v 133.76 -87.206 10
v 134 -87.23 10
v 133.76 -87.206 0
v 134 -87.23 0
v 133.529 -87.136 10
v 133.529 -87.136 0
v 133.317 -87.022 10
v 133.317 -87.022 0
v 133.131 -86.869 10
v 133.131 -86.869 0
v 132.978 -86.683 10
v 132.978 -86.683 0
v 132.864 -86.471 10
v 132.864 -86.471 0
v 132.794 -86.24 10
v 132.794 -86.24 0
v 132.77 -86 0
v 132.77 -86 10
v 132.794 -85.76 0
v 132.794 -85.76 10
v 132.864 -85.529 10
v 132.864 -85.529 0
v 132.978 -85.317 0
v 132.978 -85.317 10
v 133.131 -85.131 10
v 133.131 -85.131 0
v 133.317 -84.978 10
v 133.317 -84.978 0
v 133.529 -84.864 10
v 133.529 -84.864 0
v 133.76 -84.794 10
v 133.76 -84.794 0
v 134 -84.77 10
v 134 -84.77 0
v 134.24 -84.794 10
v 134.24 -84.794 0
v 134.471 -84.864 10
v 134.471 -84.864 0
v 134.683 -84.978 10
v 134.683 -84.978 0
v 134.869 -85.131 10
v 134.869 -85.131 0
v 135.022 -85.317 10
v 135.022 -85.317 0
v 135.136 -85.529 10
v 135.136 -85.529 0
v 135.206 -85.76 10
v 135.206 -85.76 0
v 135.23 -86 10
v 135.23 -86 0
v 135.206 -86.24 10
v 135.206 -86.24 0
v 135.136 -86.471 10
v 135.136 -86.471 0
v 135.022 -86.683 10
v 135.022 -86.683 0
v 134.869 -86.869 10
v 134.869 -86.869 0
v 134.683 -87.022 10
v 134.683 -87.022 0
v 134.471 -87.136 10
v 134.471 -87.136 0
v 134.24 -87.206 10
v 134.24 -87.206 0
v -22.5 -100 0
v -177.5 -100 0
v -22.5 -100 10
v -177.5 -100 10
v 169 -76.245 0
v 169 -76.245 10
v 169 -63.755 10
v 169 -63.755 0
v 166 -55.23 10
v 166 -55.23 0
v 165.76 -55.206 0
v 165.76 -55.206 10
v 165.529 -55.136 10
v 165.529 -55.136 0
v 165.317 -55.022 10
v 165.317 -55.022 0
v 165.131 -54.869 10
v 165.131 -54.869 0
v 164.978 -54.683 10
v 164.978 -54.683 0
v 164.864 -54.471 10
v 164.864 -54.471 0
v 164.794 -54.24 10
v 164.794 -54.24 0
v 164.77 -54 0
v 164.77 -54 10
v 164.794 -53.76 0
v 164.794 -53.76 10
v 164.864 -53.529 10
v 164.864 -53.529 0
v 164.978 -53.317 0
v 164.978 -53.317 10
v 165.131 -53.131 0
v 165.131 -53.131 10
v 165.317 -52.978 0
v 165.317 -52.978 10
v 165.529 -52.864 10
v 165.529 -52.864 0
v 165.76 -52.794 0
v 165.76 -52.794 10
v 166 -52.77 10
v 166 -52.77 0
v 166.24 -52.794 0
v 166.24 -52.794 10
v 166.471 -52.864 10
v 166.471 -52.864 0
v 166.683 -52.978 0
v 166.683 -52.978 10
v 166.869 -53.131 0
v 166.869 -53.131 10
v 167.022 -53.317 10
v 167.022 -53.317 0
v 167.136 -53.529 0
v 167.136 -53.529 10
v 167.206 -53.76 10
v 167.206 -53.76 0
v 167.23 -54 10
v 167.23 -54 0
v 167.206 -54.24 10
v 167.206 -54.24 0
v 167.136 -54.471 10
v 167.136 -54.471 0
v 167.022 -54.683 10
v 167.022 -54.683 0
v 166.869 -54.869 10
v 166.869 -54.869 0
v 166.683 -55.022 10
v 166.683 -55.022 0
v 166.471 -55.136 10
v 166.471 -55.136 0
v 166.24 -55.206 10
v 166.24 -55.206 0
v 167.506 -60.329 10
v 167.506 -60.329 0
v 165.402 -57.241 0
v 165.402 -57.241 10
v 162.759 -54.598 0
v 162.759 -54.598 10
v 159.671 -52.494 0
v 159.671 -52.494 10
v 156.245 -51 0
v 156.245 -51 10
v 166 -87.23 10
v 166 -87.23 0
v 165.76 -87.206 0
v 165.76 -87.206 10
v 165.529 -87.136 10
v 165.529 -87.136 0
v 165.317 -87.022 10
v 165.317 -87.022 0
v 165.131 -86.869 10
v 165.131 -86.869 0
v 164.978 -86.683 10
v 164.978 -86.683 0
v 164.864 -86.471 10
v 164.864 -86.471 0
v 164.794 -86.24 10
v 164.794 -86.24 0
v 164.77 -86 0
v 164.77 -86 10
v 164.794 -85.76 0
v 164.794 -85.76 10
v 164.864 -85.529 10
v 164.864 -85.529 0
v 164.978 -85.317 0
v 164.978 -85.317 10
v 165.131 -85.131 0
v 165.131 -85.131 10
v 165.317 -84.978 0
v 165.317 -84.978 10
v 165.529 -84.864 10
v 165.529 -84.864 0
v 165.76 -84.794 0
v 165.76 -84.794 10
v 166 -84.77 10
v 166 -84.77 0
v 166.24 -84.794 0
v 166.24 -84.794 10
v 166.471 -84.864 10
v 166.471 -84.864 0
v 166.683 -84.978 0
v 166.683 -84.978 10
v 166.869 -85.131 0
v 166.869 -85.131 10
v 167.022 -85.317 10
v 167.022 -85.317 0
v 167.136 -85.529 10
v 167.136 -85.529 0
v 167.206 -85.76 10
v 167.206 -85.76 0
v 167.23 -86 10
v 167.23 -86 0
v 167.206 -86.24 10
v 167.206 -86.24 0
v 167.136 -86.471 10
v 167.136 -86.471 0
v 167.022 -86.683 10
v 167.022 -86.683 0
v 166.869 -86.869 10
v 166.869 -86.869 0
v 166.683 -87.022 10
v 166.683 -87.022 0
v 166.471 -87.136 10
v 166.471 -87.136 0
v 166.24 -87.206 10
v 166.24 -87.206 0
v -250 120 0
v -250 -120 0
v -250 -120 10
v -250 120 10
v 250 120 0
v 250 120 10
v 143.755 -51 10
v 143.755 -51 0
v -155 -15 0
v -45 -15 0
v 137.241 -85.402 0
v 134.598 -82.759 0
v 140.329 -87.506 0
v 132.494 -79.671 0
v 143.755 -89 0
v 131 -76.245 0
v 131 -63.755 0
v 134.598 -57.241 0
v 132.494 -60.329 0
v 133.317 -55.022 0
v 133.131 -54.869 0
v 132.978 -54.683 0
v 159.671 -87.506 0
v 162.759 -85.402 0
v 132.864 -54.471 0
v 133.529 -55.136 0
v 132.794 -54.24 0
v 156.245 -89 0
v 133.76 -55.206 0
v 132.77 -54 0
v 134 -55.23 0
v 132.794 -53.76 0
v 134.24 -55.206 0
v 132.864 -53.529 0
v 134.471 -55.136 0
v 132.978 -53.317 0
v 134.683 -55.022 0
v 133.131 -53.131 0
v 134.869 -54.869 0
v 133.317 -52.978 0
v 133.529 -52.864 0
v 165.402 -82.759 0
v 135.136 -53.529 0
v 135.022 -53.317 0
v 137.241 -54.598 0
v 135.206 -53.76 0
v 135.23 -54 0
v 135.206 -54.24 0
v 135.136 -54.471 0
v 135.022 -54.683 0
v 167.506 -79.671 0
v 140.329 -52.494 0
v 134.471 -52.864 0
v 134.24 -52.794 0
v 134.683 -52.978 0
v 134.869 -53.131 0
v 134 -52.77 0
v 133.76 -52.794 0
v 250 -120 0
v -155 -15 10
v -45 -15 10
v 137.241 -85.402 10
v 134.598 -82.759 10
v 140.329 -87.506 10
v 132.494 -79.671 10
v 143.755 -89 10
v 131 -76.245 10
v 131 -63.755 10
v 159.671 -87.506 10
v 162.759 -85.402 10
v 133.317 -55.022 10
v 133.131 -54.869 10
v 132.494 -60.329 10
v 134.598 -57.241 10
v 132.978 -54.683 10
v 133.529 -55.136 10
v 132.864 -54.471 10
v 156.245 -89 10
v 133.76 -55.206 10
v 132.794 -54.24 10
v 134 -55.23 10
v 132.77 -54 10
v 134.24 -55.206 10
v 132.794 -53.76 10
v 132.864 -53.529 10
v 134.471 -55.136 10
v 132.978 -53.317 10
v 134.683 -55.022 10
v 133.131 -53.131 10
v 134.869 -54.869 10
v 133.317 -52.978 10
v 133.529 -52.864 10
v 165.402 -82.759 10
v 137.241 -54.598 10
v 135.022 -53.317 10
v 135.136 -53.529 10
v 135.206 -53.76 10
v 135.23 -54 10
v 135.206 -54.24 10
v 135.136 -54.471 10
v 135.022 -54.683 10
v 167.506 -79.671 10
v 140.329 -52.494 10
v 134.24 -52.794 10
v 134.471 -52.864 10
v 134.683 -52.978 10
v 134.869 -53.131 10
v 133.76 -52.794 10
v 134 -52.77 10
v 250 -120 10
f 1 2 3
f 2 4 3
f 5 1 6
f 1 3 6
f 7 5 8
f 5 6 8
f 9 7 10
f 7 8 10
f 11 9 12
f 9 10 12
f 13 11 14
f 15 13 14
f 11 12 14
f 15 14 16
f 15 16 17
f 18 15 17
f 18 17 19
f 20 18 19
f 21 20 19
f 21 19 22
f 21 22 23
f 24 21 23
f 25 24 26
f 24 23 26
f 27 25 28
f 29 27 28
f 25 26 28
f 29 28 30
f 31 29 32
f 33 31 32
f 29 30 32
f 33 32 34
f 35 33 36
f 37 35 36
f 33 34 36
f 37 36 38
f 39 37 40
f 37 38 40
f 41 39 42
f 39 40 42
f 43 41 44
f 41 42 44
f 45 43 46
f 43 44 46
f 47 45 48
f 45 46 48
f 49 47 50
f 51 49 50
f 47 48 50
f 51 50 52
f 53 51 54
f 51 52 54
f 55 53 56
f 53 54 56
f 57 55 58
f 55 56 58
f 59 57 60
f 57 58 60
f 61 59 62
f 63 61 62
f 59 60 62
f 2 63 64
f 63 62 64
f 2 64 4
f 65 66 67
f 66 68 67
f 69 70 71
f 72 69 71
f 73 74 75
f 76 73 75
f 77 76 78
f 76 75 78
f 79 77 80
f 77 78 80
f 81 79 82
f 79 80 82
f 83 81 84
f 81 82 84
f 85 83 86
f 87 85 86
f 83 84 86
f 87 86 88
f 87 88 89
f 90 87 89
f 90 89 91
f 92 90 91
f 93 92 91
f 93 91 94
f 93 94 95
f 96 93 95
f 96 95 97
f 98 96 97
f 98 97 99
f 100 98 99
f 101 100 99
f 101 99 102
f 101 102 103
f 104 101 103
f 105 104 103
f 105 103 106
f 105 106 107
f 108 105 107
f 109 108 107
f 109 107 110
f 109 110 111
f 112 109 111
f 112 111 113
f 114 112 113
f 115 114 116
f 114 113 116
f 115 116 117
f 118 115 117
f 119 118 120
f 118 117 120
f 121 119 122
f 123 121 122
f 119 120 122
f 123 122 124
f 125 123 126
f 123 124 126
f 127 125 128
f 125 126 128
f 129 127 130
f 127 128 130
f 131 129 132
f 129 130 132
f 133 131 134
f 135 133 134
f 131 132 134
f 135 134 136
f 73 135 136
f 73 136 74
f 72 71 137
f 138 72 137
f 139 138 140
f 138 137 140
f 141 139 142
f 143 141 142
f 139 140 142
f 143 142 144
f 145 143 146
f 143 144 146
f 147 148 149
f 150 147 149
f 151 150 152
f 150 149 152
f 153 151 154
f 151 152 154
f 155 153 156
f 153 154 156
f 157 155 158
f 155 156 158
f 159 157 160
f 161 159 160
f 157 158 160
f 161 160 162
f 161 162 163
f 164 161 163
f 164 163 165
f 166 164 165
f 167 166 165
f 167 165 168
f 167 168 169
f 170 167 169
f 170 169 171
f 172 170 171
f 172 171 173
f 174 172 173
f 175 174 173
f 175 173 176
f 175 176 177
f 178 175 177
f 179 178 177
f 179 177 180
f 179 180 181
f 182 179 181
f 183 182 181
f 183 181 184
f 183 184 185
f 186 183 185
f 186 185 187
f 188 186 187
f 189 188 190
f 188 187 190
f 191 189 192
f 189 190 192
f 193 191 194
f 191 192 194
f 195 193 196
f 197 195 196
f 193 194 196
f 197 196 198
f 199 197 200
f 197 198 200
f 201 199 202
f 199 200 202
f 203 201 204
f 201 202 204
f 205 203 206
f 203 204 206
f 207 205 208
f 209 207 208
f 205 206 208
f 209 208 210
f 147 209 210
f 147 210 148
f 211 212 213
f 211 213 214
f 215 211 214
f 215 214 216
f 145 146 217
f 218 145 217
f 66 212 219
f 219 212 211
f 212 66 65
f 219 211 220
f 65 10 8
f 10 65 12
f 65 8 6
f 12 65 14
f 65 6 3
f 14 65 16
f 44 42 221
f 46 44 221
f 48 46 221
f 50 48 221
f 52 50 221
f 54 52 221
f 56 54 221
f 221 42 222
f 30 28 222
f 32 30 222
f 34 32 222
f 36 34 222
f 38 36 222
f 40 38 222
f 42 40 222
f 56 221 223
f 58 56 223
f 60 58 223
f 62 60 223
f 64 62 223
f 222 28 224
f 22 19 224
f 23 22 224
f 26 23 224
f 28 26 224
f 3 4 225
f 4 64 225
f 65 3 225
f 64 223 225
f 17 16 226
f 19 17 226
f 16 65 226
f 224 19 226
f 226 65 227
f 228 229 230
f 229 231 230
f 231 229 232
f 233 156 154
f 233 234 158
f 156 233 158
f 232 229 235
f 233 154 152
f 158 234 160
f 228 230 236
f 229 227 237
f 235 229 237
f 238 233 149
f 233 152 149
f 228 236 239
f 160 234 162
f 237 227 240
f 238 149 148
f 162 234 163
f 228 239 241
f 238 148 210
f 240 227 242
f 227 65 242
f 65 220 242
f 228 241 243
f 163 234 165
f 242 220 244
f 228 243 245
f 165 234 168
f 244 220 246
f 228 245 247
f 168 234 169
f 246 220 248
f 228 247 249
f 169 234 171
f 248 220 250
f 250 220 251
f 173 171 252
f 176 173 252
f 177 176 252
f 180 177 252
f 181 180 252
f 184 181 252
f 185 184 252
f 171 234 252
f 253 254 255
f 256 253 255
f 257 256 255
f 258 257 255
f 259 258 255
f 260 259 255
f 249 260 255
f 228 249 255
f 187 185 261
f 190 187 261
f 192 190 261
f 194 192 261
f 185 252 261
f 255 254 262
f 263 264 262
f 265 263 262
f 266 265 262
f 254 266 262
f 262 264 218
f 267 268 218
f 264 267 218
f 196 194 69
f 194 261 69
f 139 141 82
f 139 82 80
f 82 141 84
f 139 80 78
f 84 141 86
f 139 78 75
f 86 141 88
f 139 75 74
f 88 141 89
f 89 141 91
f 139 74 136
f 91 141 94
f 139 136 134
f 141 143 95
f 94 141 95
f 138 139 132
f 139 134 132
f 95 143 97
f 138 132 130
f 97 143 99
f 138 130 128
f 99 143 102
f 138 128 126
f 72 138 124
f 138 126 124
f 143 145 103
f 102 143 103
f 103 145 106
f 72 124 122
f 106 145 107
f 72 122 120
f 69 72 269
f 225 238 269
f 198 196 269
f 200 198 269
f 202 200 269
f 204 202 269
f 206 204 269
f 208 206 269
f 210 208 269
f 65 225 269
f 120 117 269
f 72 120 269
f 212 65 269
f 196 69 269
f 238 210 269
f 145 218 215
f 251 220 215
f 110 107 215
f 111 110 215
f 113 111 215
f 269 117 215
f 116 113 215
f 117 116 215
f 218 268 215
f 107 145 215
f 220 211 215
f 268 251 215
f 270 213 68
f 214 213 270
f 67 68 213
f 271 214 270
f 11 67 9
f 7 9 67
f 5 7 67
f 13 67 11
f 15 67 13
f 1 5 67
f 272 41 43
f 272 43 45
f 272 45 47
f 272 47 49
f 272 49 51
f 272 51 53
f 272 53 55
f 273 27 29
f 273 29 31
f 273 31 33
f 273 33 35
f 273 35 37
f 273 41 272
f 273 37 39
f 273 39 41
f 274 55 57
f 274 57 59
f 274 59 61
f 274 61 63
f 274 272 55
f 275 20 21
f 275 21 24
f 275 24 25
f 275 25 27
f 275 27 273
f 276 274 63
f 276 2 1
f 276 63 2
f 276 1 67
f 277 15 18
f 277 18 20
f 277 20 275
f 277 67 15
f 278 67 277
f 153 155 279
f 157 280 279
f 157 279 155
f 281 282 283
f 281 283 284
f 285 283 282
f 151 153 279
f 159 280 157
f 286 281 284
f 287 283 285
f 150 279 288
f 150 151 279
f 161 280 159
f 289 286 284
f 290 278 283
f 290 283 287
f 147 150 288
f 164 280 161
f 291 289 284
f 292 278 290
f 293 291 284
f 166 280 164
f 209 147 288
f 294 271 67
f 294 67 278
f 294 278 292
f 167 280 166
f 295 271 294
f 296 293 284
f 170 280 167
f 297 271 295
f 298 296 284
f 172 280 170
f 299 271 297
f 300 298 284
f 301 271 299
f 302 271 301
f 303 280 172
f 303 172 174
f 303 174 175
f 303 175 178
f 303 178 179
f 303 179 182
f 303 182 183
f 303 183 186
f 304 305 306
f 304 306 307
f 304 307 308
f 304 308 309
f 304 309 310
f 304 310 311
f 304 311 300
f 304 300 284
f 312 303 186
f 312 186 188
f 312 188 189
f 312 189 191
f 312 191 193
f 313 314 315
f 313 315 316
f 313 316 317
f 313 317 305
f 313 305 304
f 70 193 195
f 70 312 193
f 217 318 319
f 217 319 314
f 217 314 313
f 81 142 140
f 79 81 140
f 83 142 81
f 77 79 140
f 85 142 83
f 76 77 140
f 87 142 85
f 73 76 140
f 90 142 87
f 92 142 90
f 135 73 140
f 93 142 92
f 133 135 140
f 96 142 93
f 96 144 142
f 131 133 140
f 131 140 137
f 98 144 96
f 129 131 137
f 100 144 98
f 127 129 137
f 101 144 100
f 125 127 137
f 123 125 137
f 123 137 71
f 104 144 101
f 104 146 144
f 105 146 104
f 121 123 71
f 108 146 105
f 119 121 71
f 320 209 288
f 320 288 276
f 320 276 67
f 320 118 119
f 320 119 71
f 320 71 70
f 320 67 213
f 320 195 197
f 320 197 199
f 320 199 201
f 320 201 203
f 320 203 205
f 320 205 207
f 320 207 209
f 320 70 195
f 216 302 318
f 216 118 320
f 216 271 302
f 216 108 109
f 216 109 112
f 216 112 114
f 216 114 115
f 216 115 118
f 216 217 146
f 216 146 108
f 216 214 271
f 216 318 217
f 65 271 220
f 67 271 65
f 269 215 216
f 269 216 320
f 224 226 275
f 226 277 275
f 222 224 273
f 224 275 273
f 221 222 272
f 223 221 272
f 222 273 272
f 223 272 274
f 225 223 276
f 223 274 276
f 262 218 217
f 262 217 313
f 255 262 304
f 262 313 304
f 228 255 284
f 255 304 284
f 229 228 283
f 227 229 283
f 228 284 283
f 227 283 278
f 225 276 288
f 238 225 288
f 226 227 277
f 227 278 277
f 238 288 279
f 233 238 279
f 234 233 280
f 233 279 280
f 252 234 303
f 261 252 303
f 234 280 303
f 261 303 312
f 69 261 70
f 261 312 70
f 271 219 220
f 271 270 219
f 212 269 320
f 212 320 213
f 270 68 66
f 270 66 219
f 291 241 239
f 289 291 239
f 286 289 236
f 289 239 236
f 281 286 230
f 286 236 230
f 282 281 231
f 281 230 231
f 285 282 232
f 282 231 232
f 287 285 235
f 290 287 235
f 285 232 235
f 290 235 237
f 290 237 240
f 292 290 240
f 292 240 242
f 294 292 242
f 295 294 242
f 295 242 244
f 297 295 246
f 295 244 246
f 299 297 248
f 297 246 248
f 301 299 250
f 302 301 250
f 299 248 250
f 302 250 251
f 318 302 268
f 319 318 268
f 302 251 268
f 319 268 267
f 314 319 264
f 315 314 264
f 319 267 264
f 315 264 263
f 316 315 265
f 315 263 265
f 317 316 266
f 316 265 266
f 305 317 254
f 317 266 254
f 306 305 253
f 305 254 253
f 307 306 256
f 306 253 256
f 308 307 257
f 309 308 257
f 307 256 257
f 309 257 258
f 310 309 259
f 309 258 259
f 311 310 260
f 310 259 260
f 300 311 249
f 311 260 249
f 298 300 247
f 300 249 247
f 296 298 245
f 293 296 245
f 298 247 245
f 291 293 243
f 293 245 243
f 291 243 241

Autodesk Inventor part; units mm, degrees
ref_plane "YZ Plane" through (0, 0, 0) normal (1, 0, 0) x (0, 1, 0)
ref_plane "XZ Plane" through (0, 0, 0) normal (0, 1, 0) x (-1, 0, 0)
ref_plane "XY Plane" through (0, 0, 0) normal (0, 0, 1) x (1, 0, 0)
sketch "Skizze1" plane through (0, 0, 0) normal (0, 0, 1) x (1, 0, 0)
  line L0 (-250, 120) -> (250, 120)
  line L1 (250, 120) -> (250, -120)
  line L2 (250, -120) -> (-250, -120)
  line L3 (-250, -120) -> (-250, 120)
  line L4 (-250, 120) -> (250, -120) construction
  line L5 (250, 120) -> (-250, -120) construction
  point P0 (0, 0)
  dimension "d0" = 500
  dimension "d1" = 240
extrude "Extrusion1" add sketch "Skizze1" along normal blind 10
sketch "Skizze2" plane through (0, 0, 10) normal (0, 0, 1) x (1, 0, 0)
  line L0 (-250, 120) -> (-250, -120) projected
  line L1 (-250, -120) -> (250, -120) projected
  line L2 (250, -120) -> (250, 120) projected
  line L3 (-177.5, -100) -> (-155, -15)
  line L4 (-155, -15) -> (-45, -15)
  line L5 (-45, -15) -> (-22.5, -100)
  line L6 (-177.5, -100) -> (-22.5, -100)
  line L7 (143.755, -89) -> (156.245, -89)
  line L8 (169, -76.245) -> (169, -63.755)
  line L9 (156.245, -51) -> (143.755, -51)
  line L10 (131, -63.755) -> (131, -76.245)
  line L11 (143.755, -89) -> (156.245, -51) construction
  line L12 (169, -76.245) -> (131, -63.755) construction
  arc A0 (156.245, -89) -> (169, -76.245) centre (150, -70) ccw
  arc A1 (131, -76.245) -> (143.755, -89) centre (150, -70) ccw
  arc A2 (169, -63.755) -> (156.245, -51) centre (150, -70) ccw
  arc A3 (143.755, -51) -> (131, -63.755) centre (150, -70) ccw
  point P0 (0, 0)
  point P1 (-100, -15)
  point P2 (-100, -100)
  point P3 (-33.75, -57.5)
  dimension "d25" = 155
  dimension "d26" = 110
  dimension "d27" = 150
  dimension "d28" = 20
  dimension "d29" = 85
  dimension "d33" = 100
  dimension "d34" = 50
  dimension "d47" = 38
  dimension "d48" = 20
extrude "Extrusion2" cut sketch "Skizze2" against normal blind 10
sketch "Skizze3" plane through (0, 0, 10) normal (0, 0, 1) x (1, 0, 0)
  circle A0 centre (150, -70) radius 20 projected
  line L0 (134, -86) -> (166, -86)
  line L1 (166, -86) -> (166, -54)
  line L2 (166, -54) -> (134, -54)
  line L3 (134, -54) -> (134, -86)
  line L4 (134, -86) -> (166, -54) construction
  line L5 (166, -86) -> (134, -54) construction
  point P0 (0, 0)
  dimension "d35" = 32
  dimension "d36" = 32
hole "Bohrung3" at (166, -54, 10) at (134, -54, 10) at (134, -86, 10) at (166, -86, 10) direction (0, 0, -1) diameter 2.459 end through all thread size "M3x0.5" class "6H" standard "ISO Metric profile"
properties part number "Lid_TopPanel2" material "Polycarbonat, klar"
